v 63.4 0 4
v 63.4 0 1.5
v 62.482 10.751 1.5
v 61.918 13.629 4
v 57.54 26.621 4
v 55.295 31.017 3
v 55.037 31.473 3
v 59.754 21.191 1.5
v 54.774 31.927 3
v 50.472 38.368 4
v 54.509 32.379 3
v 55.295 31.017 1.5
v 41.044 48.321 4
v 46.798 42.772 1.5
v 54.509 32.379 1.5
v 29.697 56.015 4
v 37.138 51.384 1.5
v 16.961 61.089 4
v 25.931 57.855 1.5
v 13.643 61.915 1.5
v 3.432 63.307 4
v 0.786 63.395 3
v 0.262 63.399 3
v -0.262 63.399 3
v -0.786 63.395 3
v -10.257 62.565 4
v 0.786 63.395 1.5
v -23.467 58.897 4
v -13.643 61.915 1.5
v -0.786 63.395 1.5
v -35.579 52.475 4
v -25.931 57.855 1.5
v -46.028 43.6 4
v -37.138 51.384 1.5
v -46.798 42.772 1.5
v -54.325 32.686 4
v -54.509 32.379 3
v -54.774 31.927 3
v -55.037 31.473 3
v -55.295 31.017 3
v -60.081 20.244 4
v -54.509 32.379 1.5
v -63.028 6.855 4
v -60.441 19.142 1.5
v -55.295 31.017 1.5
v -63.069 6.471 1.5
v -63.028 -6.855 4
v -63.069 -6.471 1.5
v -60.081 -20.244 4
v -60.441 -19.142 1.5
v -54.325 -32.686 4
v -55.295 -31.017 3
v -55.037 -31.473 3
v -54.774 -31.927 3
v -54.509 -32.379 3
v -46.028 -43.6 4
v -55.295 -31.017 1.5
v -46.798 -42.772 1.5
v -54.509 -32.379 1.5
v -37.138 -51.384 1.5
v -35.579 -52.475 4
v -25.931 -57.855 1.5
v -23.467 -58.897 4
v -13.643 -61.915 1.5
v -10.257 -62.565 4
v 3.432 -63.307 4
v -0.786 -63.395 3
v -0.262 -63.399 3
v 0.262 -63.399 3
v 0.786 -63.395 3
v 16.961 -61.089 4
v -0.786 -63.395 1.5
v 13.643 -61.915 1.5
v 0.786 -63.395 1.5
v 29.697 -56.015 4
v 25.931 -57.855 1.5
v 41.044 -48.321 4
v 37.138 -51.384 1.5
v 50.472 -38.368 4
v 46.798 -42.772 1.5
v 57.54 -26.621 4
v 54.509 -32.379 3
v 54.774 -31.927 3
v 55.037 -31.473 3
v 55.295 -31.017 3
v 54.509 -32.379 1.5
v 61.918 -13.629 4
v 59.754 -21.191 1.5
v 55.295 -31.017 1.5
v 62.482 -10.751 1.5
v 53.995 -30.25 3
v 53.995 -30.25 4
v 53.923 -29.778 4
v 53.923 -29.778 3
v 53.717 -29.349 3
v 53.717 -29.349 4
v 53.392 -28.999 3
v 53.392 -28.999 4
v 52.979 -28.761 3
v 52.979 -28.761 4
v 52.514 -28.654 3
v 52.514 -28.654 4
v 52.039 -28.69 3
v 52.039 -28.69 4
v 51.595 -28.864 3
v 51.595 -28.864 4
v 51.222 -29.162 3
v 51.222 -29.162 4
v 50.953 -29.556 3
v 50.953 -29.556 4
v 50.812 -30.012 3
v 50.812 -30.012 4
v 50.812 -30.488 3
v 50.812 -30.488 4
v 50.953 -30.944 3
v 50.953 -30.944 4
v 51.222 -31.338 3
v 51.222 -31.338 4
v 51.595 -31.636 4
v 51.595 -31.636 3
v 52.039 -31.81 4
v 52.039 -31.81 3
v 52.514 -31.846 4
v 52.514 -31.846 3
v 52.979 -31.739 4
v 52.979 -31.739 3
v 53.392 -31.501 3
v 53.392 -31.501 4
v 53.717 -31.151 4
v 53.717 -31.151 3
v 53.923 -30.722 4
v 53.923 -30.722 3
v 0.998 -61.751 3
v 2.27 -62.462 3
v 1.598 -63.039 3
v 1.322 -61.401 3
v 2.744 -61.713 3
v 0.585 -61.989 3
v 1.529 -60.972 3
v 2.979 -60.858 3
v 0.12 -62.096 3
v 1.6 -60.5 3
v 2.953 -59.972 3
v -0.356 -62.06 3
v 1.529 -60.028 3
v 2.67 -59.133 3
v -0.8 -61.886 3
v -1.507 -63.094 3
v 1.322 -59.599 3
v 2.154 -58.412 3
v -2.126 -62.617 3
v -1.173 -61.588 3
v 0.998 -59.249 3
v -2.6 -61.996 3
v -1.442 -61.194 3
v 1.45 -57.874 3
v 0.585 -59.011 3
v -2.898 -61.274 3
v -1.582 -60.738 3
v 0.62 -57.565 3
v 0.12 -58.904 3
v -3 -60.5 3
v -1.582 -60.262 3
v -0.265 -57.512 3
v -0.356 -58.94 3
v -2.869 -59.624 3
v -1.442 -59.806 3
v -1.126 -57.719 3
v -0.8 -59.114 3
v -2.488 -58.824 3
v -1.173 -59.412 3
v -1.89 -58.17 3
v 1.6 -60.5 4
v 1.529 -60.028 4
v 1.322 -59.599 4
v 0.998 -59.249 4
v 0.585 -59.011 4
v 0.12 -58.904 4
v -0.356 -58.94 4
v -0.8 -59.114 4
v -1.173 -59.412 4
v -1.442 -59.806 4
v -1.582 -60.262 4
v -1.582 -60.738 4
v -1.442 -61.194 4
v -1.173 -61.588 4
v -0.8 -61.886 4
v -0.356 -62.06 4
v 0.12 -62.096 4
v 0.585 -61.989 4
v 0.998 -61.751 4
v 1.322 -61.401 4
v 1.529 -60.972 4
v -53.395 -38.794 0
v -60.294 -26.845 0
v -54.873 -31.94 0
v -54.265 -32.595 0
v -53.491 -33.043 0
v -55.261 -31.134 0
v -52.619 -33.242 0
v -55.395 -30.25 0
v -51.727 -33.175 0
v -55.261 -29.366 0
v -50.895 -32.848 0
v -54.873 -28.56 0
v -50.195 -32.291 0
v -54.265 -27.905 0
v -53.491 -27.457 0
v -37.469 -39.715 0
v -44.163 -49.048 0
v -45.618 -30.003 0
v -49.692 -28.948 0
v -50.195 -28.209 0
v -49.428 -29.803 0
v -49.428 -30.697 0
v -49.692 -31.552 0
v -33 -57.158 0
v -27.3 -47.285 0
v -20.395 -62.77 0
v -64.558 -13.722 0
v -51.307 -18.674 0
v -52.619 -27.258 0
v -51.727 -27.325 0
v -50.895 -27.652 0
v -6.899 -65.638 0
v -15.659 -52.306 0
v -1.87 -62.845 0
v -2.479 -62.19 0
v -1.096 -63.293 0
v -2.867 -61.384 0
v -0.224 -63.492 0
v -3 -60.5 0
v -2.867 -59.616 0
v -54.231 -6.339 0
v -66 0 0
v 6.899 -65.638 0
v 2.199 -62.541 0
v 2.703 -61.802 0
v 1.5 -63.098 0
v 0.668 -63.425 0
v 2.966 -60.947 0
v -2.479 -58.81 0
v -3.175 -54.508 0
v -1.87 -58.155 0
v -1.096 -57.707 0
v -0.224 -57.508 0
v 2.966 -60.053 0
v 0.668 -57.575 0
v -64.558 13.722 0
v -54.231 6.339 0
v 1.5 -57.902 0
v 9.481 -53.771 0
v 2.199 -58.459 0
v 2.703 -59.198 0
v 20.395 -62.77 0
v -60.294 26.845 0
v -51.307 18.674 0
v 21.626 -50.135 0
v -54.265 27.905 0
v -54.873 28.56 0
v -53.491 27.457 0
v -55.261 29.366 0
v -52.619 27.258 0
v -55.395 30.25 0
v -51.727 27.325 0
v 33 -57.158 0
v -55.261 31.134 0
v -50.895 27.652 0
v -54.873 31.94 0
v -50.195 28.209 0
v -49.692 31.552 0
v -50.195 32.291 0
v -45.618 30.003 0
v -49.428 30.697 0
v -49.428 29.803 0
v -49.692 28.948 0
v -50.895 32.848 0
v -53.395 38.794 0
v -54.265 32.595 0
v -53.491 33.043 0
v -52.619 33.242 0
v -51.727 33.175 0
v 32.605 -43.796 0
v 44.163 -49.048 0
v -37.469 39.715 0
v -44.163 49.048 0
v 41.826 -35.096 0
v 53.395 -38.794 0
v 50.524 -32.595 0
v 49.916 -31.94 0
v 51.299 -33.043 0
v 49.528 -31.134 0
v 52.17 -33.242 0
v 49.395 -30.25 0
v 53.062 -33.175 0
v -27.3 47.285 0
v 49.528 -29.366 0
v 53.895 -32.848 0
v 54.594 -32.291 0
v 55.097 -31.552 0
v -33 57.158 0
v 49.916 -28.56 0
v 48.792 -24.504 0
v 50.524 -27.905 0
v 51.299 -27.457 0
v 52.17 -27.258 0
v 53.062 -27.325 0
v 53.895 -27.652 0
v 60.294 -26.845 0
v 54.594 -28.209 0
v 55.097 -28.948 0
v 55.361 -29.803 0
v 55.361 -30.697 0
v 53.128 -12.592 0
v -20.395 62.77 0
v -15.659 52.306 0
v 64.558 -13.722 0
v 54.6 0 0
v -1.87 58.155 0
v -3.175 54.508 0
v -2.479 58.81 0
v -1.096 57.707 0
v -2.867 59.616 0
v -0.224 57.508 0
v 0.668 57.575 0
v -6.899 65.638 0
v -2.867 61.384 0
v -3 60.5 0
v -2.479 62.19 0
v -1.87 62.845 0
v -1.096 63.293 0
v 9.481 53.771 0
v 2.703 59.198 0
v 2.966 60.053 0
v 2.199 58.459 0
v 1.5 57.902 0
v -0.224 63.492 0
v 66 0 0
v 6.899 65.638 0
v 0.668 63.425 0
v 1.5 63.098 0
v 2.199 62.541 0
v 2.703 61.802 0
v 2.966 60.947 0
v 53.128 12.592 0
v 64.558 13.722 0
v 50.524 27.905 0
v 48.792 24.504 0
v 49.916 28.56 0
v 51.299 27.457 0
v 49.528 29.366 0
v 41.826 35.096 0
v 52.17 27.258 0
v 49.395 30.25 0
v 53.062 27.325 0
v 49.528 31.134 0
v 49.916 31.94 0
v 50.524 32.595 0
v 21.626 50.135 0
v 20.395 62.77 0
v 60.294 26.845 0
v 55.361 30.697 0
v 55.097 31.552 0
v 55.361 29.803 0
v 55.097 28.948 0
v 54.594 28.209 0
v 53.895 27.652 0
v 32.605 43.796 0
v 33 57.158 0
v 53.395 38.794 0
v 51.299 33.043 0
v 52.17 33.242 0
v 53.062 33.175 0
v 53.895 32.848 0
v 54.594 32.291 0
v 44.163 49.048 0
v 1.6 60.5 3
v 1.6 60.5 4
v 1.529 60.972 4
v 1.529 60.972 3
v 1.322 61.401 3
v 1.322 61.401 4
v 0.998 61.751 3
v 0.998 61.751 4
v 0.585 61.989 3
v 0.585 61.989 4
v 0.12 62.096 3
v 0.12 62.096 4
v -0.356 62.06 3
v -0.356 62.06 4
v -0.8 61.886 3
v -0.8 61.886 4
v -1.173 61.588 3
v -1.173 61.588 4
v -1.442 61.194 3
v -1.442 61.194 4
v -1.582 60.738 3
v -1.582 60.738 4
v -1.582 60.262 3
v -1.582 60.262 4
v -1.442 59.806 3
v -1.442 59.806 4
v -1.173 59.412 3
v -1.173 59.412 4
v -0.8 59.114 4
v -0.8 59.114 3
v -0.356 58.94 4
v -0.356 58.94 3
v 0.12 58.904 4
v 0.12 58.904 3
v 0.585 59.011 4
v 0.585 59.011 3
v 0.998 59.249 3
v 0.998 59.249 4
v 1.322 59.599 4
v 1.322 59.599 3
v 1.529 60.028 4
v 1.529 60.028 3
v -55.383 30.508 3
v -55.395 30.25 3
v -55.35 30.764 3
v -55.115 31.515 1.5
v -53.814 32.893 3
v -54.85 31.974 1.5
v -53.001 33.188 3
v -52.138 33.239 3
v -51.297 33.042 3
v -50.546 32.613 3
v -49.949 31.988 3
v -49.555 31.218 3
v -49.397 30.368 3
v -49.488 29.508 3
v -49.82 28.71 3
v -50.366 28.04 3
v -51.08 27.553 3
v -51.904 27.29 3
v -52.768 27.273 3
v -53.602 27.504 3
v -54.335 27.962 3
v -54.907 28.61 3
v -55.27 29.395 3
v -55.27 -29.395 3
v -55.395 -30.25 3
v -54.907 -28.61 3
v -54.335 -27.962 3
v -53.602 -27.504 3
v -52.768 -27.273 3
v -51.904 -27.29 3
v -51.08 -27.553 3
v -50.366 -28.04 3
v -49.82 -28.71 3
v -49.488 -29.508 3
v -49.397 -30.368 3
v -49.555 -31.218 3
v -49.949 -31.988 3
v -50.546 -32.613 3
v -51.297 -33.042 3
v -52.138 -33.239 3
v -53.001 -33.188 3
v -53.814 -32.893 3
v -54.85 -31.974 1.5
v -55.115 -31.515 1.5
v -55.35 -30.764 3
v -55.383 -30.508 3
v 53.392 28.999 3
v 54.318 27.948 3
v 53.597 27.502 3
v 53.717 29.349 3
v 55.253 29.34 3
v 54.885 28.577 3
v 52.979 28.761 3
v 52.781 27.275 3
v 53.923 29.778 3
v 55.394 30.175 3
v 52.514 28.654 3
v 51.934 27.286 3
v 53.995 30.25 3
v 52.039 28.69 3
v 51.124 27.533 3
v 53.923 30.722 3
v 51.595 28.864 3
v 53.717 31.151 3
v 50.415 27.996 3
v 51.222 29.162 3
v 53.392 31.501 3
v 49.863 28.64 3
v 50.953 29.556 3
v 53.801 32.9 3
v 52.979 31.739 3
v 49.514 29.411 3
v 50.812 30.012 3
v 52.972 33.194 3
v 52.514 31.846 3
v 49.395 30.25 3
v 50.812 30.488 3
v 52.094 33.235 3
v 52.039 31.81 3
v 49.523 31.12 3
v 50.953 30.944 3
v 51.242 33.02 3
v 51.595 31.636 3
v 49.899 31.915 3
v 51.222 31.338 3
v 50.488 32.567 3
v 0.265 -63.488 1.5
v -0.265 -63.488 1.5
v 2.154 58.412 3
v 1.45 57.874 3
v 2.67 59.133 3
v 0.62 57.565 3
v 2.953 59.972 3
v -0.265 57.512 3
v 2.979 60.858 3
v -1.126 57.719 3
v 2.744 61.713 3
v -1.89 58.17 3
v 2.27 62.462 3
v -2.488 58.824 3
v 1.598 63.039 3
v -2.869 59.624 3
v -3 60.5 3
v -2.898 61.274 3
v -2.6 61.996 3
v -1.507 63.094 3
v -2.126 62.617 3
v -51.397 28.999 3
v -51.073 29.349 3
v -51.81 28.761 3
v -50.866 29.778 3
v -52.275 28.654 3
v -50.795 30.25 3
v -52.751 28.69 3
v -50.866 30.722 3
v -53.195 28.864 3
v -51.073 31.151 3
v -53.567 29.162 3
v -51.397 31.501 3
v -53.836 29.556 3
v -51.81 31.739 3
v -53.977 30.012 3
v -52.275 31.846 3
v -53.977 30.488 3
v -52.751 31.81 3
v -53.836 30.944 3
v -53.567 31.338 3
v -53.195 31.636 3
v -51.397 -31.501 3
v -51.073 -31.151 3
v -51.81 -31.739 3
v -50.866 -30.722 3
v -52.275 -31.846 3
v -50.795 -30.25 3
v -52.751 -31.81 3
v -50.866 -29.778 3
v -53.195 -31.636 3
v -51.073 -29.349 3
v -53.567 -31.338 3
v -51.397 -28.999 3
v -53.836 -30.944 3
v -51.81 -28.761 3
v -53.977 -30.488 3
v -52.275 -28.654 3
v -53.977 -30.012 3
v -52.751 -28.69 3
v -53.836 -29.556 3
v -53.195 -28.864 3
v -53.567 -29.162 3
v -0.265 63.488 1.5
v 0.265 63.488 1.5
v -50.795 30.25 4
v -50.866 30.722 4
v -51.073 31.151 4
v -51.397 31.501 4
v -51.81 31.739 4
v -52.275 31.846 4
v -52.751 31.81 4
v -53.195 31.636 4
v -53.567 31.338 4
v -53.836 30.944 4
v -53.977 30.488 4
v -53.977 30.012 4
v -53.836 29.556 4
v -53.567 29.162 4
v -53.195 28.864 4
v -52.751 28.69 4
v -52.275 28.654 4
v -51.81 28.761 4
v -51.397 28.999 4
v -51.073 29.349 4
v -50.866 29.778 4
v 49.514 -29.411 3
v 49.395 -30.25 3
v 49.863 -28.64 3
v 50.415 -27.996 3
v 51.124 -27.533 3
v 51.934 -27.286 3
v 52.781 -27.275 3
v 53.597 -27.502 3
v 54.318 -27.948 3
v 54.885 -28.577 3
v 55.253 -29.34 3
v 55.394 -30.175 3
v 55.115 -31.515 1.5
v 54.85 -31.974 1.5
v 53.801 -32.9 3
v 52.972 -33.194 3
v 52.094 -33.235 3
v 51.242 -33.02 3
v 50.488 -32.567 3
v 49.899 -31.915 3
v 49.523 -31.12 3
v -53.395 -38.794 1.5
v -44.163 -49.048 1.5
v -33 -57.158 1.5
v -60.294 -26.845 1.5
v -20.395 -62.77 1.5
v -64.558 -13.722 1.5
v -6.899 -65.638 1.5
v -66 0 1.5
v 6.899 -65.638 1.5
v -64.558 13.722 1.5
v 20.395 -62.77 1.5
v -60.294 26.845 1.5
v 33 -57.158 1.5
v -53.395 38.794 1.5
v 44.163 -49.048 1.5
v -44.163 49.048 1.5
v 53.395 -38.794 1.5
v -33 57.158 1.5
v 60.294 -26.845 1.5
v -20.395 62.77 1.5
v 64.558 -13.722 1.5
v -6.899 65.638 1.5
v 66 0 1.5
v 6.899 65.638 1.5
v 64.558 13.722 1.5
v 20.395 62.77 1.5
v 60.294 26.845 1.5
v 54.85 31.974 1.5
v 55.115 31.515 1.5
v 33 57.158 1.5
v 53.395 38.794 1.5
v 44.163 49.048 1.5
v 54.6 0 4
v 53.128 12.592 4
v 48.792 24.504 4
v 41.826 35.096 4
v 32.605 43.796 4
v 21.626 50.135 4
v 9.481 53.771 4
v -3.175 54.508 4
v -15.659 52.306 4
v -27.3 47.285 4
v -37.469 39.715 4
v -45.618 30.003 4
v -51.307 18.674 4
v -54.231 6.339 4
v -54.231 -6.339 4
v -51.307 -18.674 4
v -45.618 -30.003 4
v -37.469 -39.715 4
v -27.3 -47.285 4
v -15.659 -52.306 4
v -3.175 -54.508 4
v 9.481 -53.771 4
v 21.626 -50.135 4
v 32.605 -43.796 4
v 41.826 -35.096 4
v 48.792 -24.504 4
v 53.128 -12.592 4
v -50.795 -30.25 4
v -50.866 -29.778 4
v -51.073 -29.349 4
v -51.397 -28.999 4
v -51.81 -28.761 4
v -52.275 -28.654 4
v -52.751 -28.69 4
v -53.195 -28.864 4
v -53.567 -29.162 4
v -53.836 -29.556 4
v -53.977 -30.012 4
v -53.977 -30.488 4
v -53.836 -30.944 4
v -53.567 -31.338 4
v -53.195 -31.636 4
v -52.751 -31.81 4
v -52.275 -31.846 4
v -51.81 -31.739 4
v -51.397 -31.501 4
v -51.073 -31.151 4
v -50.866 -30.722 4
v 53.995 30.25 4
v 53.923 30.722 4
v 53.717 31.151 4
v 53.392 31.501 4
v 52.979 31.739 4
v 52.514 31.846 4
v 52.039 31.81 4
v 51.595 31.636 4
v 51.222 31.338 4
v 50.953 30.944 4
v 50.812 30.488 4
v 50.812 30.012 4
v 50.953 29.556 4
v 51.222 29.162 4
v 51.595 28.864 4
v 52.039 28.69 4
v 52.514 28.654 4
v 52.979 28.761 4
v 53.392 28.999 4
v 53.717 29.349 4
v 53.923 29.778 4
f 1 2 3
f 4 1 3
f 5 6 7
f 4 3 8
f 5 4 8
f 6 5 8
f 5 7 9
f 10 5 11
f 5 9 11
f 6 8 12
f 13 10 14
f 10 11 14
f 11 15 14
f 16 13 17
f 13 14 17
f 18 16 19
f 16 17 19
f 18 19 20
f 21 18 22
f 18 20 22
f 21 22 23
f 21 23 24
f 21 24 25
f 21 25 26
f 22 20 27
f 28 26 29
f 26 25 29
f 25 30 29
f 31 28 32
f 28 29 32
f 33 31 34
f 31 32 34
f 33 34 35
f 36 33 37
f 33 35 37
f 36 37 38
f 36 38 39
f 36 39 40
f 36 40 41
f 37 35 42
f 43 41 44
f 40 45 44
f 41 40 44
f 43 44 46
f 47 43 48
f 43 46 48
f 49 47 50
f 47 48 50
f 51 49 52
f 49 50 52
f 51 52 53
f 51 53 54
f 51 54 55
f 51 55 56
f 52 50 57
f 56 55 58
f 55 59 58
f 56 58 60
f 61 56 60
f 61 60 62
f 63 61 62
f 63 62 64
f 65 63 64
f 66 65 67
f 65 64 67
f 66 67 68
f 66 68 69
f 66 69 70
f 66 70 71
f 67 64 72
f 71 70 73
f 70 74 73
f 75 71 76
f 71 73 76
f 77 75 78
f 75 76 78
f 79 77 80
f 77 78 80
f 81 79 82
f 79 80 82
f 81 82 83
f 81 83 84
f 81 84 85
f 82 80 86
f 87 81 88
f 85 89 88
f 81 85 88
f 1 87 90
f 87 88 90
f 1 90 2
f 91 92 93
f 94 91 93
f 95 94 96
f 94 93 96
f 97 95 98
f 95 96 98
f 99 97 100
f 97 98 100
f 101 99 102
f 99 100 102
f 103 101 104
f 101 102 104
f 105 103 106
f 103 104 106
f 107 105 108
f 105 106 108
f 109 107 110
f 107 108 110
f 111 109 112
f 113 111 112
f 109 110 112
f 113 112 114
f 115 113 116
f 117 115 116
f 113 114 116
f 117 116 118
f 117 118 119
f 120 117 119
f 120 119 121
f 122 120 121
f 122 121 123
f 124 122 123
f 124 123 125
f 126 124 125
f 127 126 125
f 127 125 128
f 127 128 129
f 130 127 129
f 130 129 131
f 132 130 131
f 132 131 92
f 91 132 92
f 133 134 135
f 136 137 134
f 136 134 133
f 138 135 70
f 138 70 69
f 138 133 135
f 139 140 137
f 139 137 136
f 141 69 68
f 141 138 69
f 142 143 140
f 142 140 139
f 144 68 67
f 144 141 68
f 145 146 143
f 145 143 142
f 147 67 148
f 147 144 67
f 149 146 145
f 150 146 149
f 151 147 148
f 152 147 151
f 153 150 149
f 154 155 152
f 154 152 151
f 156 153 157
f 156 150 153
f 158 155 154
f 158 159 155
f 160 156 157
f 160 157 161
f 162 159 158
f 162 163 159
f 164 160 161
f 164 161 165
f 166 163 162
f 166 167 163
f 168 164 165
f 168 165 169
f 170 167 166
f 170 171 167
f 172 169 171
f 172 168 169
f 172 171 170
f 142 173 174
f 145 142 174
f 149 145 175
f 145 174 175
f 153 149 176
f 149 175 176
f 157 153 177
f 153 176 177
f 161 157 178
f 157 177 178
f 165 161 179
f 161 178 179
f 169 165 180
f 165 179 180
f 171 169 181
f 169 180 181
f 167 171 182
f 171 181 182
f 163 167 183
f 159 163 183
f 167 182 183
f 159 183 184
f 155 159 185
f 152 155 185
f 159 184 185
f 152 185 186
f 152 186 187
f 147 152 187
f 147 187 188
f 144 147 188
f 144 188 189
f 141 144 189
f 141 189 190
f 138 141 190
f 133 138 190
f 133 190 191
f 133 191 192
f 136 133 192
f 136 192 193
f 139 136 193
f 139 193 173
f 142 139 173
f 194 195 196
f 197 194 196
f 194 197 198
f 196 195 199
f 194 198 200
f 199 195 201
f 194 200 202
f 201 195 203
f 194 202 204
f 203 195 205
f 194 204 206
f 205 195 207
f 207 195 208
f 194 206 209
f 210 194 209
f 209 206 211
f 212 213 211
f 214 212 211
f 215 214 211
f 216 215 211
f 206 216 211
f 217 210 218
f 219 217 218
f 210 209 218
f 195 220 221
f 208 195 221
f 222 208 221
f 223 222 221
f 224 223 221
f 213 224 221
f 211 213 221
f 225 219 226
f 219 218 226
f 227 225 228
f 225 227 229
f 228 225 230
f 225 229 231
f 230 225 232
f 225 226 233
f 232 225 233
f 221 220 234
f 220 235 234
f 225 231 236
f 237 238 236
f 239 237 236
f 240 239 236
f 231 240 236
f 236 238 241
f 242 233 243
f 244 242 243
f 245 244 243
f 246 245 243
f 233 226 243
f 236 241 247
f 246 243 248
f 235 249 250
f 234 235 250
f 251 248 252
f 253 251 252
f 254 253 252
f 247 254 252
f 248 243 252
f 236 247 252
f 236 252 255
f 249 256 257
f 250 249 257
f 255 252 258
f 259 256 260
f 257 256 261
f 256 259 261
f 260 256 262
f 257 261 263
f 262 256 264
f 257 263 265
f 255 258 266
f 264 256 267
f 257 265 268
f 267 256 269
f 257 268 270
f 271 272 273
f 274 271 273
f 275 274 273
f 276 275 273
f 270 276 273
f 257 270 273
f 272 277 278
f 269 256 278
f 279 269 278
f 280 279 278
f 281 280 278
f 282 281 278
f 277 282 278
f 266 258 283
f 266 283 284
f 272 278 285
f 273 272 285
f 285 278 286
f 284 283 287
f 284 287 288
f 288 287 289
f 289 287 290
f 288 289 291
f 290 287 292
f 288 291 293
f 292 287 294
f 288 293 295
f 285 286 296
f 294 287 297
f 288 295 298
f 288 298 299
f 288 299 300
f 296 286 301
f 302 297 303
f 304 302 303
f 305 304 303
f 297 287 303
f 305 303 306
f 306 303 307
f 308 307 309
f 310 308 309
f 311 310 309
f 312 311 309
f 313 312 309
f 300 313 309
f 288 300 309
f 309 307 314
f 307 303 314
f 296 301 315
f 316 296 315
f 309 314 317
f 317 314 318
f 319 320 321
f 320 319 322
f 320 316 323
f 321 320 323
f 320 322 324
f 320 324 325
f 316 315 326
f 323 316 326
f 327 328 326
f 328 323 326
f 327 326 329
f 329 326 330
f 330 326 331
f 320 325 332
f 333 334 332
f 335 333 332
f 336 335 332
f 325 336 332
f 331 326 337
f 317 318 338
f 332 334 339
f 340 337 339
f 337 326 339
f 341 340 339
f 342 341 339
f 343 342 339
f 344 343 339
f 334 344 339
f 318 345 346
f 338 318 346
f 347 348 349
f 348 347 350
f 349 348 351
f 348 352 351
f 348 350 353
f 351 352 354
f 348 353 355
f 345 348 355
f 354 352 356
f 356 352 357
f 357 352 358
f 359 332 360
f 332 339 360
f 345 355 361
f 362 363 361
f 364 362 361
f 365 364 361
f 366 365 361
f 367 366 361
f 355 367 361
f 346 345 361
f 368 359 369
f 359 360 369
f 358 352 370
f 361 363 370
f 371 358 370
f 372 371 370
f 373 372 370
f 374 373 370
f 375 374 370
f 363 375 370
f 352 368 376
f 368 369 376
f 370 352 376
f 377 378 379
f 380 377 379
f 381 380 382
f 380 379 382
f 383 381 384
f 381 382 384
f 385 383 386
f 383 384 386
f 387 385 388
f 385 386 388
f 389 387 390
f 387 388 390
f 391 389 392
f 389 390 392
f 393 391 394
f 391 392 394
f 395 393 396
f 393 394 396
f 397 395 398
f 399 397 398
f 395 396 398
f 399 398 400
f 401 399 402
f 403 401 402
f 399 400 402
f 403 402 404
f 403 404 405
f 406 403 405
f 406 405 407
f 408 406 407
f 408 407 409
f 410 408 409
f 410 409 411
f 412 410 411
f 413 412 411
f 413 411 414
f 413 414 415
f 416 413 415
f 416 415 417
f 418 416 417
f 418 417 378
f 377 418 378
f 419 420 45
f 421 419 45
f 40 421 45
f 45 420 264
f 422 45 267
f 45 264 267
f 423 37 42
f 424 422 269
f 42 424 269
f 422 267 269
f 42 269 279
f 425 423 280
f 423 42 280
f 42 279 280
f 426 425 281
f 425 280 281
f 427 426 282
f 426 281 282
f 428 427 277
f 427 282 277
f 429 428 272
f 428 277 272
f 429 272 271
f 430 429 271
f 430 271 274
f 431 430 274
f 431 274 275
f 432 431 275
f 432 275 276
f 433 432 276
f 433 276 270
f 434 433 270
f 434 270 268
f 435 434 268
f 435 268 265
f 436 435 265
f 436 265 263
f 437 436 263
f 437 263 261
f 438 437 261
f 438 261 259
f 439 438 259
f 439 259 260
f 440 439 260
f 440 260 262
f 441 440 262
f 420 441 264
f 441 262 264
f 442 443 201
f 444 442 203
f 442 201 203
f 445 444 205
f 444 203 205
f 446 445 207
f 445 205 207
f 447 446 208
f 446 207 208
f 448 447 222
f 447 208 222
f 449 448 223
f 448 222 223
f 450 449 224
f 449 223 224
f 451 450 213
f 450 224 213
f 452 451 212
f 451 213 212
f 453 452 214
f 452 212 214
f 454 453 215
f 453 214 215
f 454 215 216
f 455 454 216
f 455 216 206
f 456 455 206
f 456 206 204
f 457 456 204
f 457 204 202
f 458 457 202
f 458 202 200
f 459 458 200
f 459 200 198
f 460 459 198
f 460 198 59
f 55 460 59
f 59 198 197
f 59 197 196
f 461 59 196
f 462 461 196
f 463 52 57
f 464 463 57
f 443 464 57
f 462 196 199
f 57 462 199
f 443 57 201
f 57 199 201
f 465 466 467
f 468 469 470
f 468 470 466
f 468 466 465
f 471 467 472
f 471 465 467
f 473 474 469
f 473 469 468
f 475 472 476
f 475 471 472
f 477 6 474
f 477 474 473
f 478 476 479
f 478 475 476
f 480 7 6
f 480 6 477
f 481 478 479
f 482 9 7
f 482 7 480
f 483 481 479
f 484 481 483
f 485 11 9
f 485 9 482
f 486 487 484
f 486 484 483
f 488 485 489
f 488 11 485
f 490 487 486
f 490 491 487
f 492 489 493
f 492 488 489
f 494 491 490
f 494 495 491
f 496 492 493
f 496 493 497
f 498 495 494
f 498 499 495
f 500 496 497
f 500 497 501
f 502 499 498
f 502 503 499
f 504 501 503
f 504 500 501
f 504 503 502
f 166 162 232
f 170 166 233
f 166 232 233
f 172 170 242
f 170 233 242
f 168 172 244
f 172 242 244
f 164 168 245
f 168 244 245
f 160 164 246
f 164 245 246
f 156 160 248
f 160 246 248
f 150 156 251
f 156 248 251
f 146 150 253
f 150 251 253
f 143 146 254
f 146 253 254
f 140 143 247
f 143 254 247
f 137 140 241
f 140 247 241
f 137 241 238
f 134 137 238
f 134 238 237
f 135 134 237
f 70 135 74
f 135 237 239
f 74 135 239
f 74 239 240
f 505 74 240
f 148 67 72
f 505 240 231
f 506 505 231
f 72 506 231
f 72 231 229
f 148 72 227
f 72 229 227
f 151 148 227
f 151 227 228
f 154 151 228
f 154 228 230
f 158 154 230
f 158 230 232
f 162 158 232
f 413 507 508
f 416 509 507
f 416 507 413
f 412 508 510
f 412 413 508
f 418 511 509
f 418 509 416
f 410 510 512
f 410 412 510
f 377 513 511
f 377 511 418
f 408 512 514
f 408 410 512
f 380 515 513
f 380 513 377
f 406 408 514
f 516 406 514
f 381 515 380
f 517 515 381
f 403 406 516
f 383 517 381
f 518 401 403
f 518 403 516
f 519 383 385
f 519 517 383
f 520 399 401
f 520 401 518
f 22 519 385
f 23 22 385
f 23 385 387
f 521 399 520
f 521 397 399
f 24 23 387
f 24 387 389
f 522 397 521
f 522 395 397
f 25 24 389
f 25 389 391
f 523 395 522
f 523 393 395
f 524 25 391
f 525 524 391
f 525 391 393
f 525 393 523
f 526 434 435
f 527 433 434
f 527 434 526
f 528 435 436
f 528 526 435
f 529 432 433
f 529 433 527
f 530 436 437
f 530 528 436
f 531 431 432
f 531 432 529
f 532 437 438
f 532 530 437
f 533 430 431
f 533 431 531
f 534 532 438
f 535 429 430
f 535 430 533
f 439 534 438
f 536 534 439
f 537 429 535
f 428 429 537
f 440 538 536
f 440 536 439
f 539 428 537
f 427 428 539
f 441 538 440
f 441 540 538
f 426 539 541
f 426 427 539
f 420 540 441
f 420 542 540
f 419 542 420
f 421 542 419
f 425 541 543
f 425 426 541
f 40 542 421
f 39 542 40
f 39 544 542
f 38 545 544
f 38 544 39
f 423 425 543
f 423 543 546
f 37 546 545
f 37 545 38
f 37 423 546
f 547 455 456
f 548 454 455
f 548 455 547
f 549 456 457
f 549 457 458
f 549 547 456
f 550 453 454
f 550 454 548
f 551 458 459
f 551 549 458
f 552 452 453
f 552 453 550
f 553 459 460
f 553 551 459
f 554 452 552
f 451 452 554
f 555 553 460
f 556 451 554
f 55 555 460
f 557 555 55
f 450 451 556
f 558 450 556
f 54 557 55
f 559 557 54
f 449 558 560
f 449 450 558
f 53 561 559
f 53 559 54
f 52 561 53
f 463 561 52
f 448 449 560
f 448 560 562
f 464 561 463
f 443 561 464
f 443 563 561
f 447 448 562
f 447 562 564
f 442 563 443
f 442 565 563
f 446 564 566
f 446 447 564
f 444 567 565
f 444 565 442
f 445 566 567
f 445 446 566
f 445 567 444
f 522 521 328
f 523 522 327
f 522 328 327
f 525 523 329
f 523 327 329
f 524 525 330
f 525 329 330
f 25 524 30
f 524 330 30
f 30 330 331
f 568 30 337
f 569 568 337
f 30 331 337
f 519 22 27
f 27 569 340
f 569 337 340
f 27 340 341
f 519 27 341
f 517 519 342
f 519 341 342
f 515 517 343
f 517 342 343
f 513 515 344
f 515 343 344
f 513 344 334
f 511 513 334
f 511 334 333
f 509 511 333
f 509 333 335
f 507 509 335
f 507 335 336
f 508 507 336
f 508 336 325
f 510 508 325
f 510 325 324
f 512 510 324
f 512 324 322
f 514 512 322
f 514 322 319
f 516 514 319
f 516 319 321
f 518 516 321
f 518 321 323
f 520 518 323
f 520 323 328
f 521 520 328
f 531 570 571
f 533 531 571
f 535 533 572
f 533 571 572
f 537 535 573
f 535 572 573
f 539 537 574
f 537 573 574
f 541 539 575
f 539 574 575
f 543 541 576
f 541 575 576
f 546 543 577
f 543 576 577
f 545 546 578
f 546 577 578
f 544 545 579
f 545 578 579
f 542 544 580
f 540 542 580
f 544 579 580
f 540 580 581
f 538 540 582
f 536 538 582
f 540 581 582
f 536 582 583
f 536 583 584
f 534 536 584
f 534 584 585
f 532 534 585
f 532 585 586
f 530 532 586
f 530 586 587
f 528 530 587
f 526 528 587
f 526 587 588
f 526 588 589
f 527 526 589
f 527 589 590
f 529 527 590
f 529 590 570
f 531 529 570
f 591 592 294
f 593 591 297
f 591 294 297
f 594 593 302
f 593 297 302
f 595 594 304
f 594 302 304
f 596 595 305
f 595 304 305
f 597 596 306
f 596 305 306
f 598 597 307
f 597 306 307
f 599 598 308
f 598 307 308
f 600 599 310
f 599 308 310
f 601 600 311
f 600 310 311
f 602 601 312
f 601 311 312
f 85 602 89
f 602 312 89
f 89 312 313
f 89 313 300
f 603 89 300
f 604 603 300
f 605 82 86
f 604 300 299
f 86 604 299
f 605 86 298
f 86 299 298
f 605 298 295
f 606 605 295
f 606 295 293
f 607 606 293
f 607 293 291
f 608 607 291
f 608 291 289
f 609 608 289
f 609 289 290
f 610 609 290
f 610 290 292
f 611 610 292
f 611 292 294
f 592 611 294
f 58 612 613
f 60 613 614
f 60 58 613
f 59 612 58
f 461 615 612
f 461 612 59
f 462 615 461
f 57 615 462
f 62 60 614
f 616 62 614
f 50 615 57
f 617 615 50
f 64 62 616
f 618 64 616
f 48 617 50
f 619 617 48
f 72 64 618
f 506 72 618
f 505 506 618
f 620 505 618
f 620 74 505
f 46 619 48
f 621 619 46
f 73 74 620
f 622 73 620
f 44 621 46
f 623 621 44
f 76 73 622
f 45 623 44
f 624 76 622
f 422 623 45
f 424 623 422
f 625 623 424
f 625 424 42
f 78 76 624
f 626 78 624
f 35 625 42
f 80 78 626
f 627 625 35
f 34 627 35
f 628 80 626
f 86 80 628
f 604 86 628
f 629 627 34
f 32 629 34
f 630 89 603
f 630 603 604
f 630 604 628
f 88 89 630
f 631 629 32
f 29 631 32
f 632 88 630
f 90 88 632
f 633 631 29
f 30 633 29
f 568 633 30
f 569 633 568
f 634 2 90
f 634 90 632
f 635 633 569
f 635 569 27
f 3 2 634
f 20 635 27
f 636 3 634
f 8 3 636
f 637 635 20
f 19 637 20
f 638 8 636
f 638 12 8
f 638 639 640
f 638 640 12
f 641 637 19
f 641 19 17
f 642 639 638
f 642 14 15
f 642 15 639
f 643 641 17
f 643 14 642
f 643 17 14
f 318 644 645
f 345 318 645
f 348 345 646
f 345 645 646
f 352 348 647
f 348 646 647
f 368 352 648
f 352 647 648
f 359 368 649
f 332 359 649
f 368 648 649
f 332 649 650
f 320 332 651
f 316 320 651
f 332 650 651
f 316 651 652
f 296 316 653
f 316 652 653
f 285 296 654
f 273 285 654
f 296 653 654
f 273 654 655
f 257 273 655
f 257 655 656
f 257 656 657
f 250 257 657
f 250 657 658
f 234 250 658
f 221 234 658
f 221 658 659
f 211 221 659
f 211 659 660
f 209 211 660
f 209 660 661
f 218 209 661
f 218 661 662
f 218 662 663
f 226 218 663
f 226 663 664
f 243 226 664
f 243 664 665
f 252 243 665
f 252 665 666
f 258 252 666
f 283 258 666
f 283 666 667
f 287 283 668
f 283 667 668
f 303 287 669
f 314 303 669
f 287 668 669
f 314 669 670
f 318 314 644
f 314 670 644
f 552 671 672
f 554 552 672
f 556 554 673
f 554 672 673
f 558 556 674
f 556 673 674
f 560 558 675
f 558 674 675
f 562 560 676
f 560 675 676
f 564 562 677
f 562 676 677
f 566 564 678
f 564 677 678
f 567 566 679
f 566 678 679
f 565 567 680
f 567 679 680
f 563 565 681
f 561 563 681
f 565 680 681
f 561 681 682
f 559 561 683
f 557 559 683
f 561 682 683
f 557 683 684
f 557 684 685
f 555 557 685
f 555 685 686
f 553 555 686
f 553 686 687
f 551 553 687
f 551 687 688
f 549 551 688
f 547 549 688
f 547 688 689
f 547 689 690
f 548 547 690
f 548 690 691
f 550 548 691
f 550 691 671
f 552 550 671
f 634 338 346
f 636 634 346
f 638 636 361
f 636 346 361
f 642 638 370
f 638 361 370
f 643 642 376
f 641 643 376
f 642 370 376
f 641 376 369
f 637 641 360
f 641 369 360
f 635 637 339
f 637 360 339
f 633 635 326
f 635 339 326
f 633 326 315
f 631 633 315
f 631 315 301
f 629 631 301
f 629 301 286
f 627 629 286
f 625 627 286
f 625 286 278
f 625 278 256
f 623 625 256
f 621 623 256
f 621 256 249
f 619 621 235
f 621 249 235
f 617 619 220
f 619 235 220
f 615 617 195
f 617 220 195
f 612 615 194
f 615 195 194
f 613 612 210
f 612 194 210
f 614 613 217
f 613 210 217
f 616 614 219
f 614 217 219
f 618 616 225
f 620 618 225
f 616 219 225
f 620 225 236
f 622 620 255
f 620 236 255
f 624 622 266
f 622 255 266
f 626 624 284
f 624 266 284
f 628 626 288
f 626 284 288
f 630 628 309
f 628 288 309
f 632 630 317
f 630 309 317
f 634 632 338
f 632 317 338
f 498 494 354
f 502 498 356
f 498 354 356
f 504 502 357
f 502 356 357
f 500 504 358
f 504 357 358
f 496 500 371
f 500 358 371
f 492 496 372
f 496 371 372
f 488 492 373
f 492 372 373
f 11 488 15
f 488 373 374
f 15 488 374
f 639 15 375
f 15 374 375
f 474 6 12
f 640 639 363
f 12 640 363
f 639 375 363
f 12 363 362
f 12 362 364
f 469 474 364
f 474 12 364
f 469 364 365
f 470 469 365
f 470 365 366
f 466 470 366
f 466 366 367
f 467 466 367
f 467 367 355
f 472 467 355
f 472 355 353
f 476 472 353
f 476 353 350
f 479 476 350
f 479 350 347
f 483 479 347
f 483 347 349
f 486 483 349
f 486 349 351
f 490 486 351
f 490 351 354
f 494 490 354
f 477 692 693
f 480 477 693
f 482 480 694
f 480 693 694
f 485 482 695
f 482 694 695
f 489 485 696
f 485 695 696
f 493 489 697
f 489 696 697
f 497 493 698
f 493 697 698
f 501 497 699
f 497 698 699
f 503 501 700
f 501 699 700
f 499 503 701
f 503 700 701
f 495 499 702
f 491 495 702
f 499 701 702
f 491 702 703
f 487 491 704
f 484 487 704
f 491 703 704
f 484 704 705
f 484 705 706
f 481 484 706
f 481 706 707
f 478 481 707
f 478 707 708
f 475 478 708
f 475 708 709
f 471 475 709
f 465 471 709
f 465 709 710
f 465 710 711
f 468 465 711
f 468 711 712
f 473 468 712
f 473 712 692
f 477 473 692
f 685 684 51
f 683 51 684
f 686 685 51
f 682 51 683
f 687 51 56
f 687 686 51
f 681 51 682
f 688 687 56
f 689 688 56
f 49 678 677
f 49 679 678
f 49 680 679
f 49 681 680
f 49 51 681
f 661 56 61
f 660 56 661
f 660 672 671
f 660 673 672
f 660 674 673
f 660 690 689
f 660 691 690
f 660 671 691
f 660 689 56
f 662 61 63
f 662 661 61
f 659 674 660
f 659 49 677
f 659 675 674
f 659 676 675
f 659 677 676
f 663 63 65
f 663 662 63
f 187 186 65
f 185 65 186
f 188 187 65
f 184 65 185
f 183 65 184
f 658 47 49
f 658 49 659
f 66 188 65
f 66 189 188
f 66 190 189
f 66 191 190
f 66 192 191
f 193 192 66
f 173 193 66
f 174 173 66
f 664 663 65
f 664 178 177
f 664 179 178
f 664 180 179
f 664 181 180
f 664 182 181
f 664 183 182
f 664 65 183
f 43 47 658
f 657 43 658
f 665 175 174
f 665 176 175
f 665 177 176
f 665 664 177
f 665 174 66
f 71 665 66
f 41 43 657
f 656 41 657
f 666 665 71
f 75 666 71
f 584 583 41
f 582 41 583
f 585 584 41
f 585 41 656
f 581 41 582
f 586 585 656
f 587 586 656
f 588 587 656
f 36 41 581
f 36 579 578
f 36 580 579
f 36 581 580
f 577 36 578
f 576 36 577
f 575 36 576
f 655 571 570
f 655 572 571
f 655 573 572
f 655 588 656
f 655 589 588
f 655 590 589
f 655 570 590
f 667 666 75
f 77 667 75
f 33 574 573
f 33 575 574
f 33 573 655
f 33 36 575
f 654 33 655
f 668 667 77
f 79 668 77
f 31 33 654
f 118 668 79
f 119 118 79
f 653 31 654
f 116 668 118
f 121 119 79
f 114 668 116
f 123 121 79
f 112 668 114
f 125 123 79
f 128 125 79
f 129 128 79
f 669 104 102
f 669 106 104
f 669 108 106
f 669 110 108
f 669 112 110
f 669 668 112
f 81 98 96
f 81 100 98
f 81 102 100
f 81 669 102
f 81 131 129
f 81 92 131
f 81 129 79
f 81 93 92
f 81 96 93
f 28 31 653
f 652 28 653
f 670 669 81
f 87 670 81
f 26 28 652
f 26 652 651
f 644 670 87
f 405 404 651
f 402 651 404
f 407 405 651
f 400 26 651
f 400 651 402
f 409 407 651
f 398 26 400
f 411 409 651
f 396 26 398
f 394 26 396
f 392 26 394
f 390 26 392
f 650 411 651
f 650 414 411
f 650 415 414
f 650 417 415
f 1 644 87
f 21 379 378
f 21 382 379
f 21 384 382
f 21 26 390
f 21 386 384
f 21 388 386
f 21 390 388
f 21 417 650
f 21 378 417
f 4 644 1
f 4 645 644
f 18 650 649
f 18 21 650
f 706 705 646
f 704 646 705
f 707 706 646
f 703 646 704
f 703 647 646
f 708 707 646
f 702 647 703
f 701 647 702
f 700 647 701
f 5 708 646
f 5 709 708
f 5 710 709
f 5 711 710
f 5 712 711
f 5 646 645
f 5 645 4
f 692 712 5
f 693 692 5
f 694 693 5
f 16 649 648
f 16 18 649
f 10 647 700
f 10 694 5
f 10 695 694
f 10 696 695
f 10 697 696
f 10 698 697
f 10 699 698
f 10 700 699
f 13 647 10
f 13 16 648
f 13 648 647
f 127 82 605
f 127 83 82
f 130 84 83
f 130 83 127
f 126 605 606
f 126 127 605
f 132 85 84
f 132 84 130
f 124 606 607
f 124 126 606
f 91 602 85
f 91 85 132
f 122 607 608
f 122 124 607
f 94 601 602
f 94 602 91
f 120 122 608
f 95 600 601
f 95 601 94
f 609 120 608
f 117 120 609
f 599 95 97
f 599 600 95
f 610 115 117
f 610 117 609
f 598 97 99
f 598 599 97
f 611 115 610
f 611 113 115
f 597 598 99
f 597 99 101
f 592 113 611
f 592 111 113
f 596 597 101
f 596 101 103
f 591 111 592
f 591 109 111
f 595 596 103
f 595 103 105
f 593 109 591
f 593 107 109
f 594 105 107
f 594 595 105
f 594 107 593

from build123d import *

# Parameters (mm, degrees)
SKETCH1_R           = 66
BOSS_EXTRUDE1_DEPTH = 1.5
SKETCH2_R           = 63.4
BOSS_EXTRUDE2_DEPTH = 2.5
SKETCH3_R           = 54.6
CUT_EXTRUDE1_DEPTH  = 10
SKETCH4_R           = 1.6
CUT_EXTRUDE2_DEPTH  = 10
SKETCH5_R           = 3
CUT_EXTRUDE3_DEPTH  = 3


with BuildPart() as part:
    # Sketch1 → Boss-Extrude1 (new body)
    with BuildSketch(Plane.XY):
        Circle(SKETCH1_R)
    extrude(amount=BOSS_EXTRUDE1_DEPTH)

    # Sketch2 → Boss-Extrude2 (add)
    with BuildSketch(Plane.XY.offset(1.5)):
        Circle(SKETCH2_R)
    extrude(amount=BOSS_EXTRUDE2_DEPTH)

    # Sketch3 → Cut-Extrude1 (cut)
    with BuildSketch(Plane.XY.offset(4)):
        Circle(SKETCH3_R)
    extrude(amount=-CUT_EXTRUDE1_DEPTH, mode=Mode.SUBTRACT)

    # Sketch4 → Cut-Extrude2 (cut)
    with BuildSketch(Plane.XY.offset(4)):
        with Locations((0, 60.5)):
            Circle(SKETCH4_R)
        with Locations((52.394536929, 30.25)):
            Circle(SKETCH4_R)
        with Locations((52.394536929, -30.25)):
            Circle(SKETCH4_R)
        with Locations((0, -60.5)):
            Circle(SKETCH4_R)
        with Locations((-52.394536929, -30.25)):
            Circle(SKETCH4_R)
        with Locations((-52.394536929, 30.25)):
            Circle(SKETCH4_R)
    extrude(amount=-CUT_EXTRUDE2_DEPTH, mode=Mode.SUBTRACT)

    # Sketch5 → Cut-Extrude3 (cut)
    with BuildSketch(Plane(origin=(0, 0, 0), x_dir=(-1, 0, 0), z_dir=(0, 0, -1))):
        with Locations((-52.394536929, 30.25)):
            Circle(SKETCH5_R)
        with Locations((0, 60.5)):
            Circle(SKETCH5_R)
        with Locations((-52.394536929, -30.25)):
            Circle(SKETCH5_R)
        with Locations((0, -60.5)):
            Circle(SKETCH5_R)
        with Locations((52.394536929, -30.25)):
            Circle(SKETCH5_R)
        with Locations((52.394536929, 30.25)):
            Circle(SKETCH5_R)
    extrude(amount=-CUT_EXTRUDE3_DEPTH, mode=Mode.SUBTRACT)


solid = part.part
